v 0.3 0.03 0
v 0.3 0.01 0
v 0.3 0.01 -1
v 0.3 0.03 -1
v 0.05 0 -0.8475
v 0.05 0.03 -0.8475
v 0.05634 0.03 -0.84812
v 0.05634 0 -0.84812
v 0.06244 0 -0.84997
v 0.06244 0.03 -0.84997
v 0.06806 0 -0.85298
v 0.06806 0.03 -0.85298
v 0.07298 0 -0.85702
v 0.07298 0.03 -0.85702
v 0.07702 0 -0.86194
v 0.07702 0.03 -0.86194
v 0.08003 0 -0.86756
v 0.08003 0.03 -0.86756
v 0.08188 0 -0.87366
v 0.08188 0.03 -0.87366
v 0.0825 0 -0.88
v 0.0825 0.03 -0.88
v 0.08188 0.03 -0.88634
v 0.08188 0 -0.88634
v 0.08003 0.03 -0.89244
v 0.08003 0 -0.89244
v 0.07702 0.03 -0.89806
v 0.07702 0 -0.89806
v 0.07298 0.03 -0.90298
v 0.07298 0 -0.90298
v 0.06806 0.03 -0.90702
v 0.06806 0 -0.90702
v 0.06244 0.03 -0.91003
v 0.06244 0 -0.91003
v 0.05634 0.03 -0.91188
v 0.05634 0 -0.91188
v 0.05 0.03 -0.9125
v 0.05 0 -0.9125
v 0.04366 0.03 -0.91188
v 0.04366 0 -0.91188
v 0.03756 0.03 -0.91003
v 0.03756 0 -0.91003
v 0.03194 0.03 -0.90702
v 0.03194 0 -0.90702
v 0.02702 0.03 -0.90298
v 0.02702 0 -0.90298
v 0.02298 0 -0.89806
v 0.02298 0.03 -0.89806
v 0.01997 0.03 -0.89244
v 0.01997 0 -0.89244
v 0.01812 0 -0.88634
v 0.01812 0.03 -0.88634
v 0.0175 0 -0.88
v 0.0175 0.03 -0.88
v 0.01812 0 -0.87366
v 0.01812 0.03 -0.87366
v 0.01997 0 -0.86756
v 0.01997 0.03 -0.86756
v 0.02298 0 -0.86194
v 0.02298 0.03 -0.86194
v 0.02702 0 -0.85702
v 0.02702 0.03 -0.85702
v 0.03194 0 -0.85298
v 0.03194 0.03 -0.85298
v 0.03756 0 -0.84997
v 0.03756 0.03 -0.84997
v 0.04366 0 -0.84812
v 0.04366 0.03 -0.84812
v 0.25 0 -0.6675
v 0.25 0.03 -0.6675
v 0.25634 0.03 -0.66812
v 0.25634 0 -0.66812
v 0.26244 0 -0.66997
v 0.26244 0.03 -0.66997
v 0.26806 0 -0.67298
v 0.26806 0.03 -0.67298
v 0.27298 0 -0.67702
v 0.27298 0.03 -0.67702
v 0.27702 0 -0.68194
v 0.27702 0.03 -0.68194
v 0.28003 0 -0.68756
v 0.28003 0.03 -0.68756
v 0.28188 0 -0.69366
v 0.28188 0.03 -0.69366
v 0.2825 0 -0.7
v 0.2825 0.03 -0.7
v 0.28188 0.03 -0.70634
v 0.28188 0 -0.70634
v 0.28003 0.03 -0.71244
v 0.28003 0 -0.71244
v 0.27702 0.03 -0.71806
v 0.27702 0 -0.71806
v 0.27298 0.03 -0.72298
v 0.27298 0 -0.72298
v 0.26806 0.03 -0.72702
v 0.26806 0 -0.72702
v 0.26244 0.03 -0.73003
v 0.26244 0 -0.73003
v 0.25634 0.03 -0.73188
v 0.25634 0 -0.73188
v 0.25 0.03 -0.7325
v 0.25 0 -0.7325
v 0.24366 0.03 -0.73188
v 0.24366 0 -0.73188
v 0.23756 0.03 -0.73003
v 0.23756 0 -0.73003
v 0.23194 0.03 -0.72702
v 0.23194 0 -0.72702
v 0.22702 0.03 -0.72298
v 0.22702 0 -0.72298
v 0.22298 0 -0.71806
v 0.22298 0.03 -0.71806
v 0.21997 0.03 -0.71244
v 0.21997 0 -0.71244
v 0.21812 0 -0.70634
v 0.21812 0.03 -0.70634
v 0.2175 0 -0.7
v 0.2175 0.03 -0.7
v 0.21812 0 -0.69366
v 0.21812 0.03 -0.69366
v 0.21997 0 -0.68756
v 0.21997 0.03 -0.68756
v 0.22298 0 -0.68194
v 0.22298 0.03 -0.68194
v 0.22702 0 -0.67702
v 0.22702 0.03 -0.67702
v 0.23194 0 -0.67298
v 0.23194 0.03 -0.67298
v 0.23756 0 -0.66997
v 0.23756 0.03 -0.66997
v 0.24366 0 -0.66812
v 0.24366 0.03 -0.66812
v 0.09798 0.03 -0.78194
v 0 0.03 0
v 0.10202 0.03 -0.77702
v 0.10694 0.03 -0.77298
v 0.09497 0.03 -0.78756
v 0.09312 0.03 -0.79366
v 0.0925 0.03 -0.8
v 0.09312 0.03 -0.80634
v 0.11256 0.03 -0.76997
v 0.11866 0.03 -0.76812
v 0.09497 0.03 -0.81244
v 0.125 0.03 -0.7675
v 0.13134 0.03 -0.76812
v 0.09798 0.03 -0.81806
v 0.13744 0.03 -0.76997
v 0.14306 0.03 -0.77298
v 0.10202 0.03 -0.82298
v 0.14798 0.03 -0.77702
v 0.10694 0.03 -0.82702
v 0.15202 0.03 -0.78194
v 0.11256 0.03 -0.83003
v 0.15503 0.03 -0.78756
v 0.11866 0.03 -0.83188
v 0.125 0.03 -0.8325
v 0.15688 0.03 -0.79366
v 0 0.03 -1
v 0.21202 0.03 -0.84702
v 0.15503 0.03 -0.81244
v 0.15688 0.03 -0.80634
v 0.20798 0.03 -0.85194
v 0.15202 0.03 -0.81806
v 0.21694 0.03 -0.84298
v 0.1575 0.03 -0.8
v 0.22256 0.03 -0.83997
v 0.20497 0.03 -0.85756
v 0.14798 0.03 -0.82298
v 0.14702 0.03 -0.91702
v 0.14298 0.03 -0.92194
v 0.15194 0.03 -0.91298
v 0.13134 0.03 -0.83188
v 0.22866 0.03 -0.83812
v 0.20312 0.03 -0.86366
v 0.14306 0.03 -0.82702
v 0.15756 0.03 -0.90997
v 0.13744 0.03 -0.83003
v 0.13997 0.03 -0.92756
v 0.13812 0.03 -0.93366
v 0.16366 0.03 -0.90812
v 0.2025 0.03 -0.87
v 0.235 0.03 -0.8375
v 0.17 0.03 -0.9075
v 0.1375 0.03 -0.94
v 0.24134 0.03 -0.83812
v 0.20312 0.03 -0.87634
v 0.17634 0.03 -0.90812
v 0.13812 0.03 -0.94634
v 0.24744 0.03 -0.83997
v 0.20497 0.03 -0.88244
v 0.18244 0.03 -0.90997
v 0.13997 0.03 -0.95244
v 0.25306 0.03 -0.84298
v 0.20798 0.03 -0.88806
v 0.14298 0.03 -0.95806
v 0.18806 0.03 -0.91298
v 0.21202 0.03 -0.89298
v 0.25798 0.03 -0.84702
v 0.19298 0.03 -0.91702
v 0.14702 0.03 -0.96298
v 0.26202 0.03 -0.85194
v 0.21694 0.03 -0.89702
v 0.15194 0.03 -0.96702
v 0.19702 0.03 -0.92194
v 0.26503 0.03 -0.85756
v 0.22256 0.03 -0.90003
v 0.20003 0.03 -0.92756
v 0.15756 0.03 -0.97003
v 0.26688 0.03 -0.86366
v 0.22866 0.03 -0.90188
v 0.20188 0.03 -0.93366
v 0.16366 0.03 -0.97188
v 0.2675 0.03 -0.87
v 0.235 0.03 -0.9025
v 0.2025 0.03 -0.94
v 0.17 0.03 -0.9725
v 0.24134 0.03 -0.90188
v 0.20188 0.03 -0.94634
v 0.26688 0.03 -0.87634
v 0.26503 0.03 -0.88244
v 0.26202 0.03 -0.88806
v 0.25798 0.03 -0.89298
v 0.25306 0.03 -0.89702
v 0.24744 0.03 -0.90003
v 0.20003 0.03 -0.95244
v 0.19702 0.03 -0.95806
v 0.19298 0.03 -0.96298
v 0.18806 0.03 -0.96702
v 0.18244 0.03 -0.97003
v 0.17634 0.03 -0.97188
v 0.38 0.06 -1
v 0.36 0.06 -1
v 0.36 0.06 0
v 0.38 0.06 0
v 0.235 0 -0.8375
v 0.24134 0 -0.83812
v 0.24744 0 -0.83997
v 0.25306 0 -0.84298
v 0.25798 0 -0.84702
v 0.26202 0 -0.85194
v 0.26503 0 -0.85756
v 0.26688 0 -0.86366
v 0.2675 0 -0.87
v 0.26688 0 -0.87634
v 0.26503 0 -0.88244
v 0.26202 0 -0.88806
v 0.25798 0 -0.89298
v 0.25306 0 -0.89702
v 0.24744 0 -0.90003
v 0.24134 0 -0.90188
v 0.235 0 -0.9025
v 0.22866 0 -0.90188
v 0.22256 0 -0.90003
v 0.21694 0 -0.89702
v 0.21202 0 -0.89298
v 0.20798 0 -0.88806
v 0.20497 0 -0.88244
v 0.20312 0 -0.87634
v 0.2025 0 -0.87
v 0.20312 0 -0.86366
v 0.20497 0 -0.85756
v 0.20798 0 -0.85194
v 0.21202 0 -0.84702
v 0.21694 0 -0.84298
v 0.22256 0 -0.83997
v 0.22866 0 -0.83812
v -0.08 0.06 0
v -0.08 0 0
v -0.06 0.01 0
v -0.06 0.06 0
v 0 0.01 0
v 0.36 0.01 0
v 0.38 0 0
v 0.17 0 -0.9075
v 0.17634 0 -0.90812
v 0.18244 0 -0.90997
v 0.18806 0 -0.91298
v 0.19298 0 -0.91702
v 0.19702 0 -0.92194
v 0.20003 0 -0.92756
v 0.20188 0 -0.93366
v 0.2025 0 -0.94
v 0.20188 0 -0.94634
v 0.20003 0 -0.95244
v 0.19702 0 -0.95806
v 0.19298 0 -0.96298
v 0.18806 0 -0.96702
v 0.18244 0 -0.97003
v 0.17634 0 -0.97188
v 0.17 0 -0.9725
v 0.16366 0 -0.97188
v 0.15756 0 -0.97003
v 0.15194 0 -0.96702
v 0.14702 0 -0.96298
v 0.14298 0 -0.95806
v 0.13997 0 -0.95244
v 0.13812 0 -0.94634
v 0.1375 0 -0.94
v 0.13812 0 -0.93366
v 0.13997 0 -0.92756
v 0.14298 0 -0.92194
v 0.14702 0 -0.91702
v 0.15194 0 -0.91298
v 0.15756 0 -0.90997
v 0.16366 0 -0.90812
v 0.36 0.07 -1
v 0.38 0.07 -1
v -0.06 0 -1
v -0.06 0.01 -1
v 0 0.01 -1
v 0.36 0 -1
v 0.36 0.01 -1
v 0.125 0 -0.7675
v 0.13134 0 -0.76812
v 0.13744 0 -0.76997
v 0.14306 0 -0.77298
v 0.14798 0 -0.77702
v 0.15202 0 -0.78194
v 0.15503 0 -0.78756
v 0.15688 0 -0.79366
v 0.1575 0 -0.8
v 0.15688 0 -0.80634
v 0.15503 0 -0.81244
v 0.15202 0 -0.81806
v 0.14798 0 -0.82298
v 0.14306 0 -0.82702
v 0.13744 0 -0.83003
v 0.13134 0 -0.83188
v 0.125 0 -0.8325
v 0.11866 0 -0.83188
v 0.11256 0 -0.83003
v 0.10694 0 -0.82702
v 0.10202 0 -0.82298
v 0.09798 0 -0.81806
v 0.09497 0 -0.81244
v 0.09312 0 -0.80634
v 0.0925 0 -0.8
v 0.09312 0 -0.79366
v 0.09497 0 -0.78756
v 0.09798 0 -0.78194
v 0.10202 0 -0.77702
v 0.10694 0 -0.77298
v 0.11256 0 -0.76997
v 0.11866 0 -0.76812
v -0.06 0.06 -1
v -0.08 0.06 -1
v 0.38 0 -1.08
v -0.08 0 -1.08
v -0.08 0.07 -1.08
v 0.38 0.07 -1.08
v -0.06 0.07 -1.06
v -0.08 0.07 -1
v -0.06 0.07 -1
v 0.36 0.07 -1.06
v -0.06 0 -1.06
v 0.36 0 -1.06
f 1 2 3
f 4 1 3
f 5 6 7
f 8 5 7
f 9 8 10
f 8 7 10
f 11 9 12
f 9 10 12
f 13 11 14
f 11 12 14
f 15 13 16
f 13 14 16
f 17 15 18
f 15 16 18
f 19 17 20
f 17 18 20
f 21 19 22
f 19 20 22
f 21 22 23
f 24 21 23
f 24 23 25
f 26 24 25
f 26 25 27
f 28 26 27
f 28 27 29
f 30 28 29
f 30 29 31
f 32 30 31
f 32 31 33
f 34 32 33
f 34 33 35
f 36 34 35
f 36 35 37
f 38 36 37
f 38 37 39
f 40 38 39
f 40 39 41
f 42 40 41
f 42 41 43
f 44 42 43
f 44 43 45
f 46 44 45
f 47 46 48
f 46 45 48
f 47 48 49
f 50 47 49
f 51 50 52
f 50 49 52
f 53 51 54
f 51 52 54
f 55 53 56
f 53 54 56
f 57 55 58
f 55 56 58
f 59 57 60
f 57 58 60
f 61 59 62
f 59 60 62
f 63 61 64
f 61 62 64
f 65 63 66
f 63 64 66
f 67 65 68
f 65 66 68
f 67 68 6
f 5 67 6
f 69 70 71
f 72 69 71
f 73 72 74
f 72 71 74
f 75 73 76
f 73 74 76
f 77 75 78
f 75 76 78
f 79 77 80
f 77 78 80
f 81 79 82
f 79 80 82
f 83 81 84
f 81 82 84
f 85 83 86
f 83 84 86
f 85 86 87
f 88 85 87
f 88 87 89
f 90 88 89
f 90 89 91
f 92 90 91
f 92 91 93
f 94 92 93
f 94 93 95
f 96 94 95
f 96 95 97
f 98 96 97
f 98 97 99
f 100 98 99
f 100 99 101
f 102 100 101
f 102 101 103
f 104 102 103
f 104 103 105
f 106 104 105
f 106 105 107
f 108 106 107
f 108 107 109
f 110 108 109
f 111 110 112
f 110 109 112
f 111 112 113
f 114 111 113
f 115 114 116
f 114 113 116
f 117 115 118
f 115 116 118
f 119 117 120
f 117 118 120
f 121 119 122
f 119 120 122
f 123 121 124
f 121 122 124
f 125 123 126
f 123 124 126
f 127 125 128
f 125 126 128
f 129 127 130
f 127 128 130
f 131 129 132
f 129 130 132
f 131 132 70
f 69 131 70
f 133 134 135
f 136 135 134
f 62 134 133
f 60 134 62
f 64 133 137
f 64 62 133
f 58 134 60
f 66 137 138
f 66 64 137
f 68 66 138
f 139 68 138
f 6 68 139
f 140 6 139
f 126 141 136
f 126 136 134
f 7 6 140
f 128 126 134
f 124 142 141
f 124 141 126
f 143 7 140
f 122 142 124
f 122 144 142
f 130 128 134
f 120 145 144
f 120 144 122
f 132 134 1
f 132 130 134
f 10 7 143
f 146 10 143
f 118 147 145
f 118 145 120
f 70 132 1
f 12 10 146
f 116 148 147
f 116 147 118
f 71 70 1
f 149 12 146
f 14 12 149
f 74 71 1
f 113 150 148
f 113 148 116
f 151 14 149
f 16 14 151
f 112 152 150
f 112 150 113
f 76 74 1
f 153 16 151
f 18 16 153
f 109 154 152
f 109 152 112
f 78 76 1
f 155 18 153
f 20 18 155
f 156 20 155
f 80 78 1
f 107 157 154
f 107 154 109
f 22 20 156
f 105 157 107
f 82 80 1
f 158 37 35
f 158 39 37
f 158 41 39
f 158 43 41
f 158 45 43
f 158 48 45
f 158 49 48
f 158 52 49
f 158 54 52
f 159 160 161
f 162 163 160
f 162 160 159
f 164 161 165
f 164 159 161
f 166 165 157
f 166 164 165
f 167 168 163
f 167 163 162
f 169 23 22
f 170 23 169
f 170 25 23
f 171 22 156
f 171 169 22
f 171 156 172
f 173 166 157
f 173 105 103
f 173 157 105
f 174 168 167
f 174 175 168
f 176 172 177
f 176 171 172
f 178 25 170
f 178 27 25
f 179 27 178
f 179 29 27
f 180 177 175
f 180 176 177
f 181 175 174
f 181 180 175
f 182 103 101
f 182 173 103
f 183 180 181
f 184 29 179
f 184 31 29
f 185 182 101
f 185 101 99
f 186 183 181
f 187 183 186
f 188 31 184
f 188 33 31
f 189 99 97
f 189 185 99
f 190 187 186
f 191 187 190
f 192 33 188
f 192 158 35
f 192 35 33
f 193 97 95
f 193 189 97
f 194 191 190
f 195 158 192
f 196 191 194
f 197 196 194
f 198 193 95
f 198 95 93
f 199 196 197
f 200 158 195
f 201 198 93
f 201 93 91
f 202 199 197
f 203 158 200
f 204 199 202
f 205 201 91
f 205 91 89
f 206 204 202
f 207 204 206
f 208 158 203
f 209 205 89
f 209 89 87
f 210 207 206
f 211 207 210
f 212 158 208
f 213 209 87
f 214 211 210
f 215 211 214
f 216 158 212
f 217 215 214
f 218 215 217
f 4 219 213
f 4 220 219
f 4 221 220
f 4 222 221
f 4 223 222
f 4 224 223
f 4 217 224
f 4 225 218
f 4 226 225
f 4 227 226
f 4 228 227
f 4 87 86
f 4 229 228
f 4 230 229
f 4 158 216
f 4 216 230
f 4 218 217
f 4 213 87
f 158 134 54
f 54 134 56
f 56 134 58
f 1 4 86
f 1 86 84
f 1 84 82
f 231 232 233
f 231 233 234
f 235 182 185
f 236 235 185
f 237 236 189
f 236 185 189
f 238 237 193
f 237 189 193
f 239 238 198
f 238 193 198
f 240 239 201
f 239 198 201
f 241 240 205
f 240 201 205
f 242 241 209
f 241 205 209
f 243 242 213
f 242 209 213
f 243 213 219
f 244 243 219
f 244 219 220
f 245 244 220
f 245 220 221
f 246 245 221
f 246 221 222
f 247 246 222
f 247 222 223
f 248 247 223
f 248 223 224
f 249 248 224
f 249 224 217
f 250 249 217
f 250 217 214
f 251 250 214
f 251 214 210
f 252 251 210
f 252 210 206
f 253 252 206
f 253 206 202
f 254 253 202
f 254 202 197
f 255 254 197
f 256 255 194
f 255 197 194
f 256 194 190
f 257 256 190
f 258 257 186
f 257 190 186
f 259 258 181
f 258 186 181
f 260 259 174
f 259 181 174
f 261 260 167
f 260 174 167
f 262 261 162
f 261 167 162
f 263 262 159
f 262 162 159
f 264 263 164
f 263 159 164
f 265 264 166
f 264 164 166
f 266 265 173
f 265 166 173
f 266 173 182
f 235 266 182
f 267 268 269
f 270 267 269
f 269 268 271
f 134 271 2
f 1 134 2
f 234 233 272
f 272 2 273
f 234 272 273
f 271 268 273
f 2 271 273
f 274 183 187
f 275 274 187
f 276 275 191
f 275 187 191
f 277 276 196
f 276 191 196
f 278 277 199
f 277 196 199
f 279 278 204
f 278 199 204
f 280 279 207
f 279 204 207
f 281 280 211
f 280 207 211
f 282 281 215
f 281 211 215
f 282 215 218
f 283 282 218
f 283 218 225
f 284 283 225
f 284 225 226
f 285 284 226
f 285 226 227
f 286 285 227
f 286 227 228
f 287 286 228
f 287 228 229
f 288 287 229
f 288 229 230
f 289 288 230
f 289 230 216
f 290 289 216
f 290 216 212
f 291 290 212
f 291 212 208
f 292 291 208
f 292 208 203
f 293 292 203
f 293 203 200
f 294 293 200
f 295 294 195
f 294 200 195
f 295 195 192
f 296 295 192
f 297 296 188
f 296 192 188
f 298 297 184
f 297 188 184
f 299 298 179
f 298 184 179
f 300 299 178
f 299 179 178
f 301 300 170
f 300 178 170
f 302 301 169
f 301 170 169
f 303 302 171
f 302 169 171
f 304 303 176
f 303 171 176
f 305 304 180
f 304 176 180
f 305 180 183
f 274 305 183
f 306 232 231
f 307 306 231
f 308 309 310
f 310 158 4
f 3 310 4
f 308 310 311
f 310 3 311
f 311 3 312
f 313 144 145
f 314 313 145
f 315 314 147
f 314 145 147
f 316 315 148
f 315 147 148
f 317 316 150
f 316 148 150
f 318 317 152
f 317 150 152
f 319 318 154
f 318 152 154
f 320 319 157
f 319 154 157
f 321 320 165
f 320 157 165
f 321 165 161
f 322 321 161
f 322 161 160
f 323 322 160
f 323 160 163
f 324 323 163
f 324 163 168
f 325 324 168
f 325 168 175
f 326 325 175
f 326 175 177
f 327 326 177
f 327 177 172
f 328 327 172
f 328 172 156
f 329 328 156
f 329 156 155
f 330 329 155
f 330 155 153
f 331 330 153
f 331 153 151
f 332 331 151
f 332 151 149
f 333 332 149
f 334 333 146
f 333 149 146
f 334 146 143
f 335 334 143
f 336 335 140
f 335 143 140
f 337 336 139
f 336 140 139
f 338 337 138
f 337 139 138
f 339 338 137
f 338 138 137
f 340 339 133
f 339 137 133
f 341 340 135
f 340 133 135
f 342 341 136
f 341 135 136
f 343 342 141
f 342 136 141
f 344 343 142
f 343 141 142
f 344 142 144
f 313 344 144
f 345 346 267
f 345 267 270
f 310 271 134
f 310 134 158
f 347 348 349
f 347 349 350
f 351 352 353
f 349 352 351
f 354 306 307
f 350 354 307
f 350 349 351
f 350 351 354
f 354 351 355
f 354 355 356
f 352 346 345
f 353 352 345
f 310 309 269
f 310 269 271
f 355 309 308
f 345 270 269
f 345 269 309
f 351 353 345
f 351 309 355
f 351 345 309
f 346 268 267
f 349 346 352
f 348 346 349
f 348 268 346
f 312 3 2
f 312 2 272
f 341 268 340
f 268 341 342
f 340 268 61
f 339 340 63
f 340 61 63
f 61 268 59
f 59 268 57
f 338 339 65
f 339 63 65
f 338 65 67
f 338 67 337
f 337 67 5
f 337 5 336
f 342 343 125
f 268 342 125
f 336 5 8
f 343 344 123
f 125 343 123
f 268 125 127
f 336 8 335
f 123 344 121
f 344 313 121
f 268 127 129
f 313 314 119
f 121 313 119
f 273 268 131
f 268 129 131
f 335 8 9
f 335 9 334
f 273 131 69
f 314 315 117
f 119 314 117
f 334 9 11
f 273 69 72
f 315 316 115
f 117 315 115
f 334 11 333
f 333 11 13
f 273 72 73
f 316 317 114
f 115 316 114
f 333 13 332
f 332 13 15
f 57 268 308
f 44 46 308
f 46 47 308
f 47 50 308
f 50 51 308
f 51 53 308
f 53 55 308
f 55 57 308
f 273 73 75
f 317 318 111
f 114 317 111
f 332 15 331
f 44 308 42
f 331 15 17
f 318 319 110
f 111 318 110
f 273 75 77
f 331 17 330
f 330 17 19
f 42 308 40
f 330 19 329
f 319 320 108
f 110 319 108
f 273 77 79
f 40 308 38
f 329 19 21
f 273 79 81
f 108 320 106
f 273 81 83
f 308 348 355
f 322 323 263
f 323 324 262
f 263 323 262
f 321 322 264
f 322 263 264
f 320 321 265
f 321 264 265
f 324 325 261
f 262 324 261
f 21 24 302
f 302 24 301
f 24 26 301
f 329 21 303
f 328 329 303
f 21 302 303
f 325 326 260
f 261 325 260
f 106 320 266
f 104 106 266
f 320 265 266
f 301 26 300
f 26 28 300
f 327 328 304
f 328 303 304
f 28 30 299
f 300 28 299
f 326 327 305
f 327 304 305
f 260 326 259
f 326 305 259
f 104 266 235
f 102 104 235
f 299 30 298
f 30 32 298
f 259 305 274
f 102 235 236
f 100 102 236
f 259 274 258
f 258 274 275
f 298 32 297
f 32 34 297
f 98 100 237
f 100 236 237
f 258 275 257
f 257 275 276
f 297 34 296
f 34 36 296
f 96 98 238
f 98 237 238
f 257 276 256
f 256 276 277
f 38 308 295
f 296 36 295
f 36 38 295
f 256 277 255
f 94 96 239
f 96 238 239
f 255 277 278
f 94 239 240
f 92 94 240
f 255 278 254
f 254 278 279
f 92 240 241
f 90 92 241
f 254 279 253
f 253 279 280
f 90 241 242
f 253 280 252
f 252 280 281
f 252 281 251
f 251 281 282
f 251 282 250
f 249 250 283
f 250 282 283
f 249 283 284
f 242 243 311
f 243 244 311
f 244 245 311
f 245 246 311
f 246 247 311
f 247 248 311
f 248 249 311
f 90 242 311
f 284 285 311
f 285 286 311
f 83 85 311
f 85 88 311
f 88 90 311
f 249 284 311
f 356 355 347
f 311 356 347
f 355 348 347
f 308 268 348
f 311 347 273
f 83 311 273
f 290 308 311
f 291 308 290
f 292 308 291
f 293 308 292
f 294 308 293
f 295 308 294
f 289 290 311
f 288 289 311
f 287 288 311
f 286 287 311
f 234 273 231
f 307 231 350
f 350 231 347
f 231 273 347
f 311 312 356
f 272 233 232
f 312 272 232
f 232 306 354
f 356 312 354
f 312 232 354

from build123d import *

# Parameters (mm, degrees)
SKETCH1_W           = 0.3
SKETCH1_H           = 1
BOSS_EXTRUDE2_DEPTH = 0.03
SKETCH1_6_W         = 0.06
SKETCH1_6_H         = 1
BOSS_EXTRUDE3_DEPTH = 0.01
SKETCH1_7_W         = 0.02
SKETCH1_7_H         = 1
BOSS_EXTRUDE4_DEPTH = 0.06
SKETCH3_W           = 0.46
SKETCH3_H           = 0.08
BOSS_EXTRUDE7_DEPTH = 0.07
CUT_EXTRUDE1_REACH  = 3.147
SKETCH6_W           = 0.42
SKETCH6_H           = 0.06
CUT_EXTRUDE2_REACH  = 3.146
SKETCH7_R           = 0.0325


with BuildPart() as part:
    # Sketch1 → Boss-Extrude2 (new body)
    with BuildSketch(Plane(origin=(0, 0, 0), x_dir=(1, 0, 0), z_dir=(0, 1, 0))):
        with Locations((0.15, 0.5)):
            Rectangle(SKETCH1_W, SKETCH1_H)
    extrude(amount=BOSS_EXTRUDE2_DEPTH)

    # Sketch1<6> → Boss-Extrude3 (add)
    with BuildSketch(Plane(origin=(0, 0, 0), x_dir=(1, 0, 0), z_dir=(0, 1, 0))):
        with Locations((-0.03, 0.5)):
            Rectangle(SKETCH1_6_W, SKETCH1_6_H)
        with Locations((0.33, 0.5)):
            Rectangle(SKETCH1_6_W, SKETCH1_6_H)
    extrude(amount=BOSS_EXTRUDE3_DEPTH)

    # Sketch1<7> → Boss-Extrude4 (add)
    with BuildSketch(Plane(origin=(0, 0, 0), x_dir=(1, 0, 0), z_dir=(0, 1, 0))):
        with Locations((-0.07, 0.5)):
            Rectangle(SKETCH1_7_W, SKETCH1_7_H)
        with Locations((0.37, 0.5)):
            Rectangle(SKETCH1_7_W, SKETCH1_7_H)
    extrude(amount=BOSS_EXTRUDE4_DEPTH)

    # Sketch3 → Boss-Extrude7 (add)
    with BuildSketch(Plane(origin=(0, 0, 0), x_dir=(1, 0, 0), z_dir=(0, 1, 0))):
        with Locations((0.15, 1.04)):
            Rectangle(SKETCH3_W, SKETCH3_H)
    extrude(amount=BOSS_EXTRUDE7_DEPTH)

    # Sketch6 → Cut-Extrude1 (cut, up to next)
    with BuildSketch(Plane(origin=(0, 0.07, 0), x_dir=(1, 0, 0), z_dir=(0, 1, 0)), mode=Mode.PRIVATE) as cut_extrude1_sk1:
        with Locations((0.15, 1.03)):
            Rectangle(SKETCH6_W, SKETCH6_H)
    cut_extrude1_tool1 = extrude(cut_extrude1_sk1.sketch, amount=-CUT_EXTRUDE1_REACH, mode=Mode.PRIVATE) & part.part
    add(cut_extrude1_tool1.solids().sort_by_distance((0.15, 0.07, -1.03))[0], mode=Mode.SUBTRACT)

    # Sketch7 → Cut-Extrude2 (cut, up to next)
    with BuildSketch(Plane(origin=(0, 0.03, 0), x_dir=(1, 0, 0), z_dir=(0, 1, 0)), mode=Mode.PRIVATE) as cut_extrude2_sk1:
        with Locations((0.05, 0.88)):
            Circle(SKETCH7_R)
    cut_extrude2_tool1 = extrude(cut_extrude2_sk1.sketch, amount=-CUT_EXTRUDE2_REACH, mode=Mode.PRIVATE) & part.part
    # Sketch7 → Cut-Extrude2 (cut, up to next)
    with BuildSketch(Plane(origin=(0, 0.03, 0), x_dir=(1, 0, 0), z_dir=(0, 1, 0)), mode=Mode.PRIVATE) as cut_extrude2_sk2:
        with Locations((0.125, 0.8)):
            Circle(SKETCH7_R)
    cut_extrude2_tool2 = extrude(cut_extrude2_sk2.sketch, amount=-CUT_EXTRUDE2_REACH, mode=Mode.PRIVATE) & part.part
    # Sketch7 → Cut-Extrude2 (cut, up to next)
    with BuildSketch(Plane(origin=(0, 0.03, 0), x_dir=(1, 0, 0), z_dir=(0, 1, 0)), mode=Mode.PRIVATE) as cut_extrude2_sk3:
        with Locations((0.235, 0.87)):
            Circle(SKETCH7_R)
    cut_extrude2_tool3 = extrude(cut_extrude2_sk3.sketch, amount=-CUT_EXTRUDE2_REACH, mode=Mode.PRIVATE) & part.part
    # Sketch7 → Cut-Extrude2 (cut, up to next)
    with BuildSketch(Plane(origin=(0, 0.03, 0), x_dir=(1, 0, 0), z_dir=(0, 1, 0)), mode=Mode.PRIVATE) as cut_extrude2_sk4:
        with Locations((0.17, 0.94)):
            Circle(SKETCH7_R)
    cut_extrude2_tool4 = extrude(cut_extrude2_sk4.sketch, amount=-CUT_EXTRUDE2_REACH, mode=Mode.PRIVATE) & part.part
    # Sketch7 → Cut-Extrude2 (cut, up to next)
    with BuildSketch(Plane(origin=(0, 0.03, 0), x_dir=(1, 0, 0), z_dir=(0, 1, 0)), mode=Mode.PRIVATE) as cut_extrude2_sk5:
        with Locations((0.25, 0.7)):
            Circle(SKETCH7_R)
    cut_extrude2_tool5 = extrude(cut_extrude2_sk5.sketch, amount=-CUT_EXTRUDE2_REACH, mode=Mode.PRIVATE) & part.part
    add(cut_extrude2_tool1.solids().sort_by_distance((0.05, 0.03, -0.88))[0], mode=Mode.SUBTRACT)
    add(cut_extrude2_tool2.solids().sort_by_distance((0.125, 0.03, -0.8))[0], mode=Mode.SUBTRACT)
    add(cut_extrude2_tool3.solids().sort_by_distance((0.235, 0.03, -0.87))[0], mode=Mode.SUBTRACT)
    add(cut_extrude2_tool4.solids().sort_by_distance((0.17, 0.03, -0.94))[0], mode=Mode.SUBTRACT)
    add(cut_extrude2_tool5.solids().sort_by_distance((0.25, 0.03, -0.7))[0], mode=Mode.SUBTRACT)


solid = part.part
